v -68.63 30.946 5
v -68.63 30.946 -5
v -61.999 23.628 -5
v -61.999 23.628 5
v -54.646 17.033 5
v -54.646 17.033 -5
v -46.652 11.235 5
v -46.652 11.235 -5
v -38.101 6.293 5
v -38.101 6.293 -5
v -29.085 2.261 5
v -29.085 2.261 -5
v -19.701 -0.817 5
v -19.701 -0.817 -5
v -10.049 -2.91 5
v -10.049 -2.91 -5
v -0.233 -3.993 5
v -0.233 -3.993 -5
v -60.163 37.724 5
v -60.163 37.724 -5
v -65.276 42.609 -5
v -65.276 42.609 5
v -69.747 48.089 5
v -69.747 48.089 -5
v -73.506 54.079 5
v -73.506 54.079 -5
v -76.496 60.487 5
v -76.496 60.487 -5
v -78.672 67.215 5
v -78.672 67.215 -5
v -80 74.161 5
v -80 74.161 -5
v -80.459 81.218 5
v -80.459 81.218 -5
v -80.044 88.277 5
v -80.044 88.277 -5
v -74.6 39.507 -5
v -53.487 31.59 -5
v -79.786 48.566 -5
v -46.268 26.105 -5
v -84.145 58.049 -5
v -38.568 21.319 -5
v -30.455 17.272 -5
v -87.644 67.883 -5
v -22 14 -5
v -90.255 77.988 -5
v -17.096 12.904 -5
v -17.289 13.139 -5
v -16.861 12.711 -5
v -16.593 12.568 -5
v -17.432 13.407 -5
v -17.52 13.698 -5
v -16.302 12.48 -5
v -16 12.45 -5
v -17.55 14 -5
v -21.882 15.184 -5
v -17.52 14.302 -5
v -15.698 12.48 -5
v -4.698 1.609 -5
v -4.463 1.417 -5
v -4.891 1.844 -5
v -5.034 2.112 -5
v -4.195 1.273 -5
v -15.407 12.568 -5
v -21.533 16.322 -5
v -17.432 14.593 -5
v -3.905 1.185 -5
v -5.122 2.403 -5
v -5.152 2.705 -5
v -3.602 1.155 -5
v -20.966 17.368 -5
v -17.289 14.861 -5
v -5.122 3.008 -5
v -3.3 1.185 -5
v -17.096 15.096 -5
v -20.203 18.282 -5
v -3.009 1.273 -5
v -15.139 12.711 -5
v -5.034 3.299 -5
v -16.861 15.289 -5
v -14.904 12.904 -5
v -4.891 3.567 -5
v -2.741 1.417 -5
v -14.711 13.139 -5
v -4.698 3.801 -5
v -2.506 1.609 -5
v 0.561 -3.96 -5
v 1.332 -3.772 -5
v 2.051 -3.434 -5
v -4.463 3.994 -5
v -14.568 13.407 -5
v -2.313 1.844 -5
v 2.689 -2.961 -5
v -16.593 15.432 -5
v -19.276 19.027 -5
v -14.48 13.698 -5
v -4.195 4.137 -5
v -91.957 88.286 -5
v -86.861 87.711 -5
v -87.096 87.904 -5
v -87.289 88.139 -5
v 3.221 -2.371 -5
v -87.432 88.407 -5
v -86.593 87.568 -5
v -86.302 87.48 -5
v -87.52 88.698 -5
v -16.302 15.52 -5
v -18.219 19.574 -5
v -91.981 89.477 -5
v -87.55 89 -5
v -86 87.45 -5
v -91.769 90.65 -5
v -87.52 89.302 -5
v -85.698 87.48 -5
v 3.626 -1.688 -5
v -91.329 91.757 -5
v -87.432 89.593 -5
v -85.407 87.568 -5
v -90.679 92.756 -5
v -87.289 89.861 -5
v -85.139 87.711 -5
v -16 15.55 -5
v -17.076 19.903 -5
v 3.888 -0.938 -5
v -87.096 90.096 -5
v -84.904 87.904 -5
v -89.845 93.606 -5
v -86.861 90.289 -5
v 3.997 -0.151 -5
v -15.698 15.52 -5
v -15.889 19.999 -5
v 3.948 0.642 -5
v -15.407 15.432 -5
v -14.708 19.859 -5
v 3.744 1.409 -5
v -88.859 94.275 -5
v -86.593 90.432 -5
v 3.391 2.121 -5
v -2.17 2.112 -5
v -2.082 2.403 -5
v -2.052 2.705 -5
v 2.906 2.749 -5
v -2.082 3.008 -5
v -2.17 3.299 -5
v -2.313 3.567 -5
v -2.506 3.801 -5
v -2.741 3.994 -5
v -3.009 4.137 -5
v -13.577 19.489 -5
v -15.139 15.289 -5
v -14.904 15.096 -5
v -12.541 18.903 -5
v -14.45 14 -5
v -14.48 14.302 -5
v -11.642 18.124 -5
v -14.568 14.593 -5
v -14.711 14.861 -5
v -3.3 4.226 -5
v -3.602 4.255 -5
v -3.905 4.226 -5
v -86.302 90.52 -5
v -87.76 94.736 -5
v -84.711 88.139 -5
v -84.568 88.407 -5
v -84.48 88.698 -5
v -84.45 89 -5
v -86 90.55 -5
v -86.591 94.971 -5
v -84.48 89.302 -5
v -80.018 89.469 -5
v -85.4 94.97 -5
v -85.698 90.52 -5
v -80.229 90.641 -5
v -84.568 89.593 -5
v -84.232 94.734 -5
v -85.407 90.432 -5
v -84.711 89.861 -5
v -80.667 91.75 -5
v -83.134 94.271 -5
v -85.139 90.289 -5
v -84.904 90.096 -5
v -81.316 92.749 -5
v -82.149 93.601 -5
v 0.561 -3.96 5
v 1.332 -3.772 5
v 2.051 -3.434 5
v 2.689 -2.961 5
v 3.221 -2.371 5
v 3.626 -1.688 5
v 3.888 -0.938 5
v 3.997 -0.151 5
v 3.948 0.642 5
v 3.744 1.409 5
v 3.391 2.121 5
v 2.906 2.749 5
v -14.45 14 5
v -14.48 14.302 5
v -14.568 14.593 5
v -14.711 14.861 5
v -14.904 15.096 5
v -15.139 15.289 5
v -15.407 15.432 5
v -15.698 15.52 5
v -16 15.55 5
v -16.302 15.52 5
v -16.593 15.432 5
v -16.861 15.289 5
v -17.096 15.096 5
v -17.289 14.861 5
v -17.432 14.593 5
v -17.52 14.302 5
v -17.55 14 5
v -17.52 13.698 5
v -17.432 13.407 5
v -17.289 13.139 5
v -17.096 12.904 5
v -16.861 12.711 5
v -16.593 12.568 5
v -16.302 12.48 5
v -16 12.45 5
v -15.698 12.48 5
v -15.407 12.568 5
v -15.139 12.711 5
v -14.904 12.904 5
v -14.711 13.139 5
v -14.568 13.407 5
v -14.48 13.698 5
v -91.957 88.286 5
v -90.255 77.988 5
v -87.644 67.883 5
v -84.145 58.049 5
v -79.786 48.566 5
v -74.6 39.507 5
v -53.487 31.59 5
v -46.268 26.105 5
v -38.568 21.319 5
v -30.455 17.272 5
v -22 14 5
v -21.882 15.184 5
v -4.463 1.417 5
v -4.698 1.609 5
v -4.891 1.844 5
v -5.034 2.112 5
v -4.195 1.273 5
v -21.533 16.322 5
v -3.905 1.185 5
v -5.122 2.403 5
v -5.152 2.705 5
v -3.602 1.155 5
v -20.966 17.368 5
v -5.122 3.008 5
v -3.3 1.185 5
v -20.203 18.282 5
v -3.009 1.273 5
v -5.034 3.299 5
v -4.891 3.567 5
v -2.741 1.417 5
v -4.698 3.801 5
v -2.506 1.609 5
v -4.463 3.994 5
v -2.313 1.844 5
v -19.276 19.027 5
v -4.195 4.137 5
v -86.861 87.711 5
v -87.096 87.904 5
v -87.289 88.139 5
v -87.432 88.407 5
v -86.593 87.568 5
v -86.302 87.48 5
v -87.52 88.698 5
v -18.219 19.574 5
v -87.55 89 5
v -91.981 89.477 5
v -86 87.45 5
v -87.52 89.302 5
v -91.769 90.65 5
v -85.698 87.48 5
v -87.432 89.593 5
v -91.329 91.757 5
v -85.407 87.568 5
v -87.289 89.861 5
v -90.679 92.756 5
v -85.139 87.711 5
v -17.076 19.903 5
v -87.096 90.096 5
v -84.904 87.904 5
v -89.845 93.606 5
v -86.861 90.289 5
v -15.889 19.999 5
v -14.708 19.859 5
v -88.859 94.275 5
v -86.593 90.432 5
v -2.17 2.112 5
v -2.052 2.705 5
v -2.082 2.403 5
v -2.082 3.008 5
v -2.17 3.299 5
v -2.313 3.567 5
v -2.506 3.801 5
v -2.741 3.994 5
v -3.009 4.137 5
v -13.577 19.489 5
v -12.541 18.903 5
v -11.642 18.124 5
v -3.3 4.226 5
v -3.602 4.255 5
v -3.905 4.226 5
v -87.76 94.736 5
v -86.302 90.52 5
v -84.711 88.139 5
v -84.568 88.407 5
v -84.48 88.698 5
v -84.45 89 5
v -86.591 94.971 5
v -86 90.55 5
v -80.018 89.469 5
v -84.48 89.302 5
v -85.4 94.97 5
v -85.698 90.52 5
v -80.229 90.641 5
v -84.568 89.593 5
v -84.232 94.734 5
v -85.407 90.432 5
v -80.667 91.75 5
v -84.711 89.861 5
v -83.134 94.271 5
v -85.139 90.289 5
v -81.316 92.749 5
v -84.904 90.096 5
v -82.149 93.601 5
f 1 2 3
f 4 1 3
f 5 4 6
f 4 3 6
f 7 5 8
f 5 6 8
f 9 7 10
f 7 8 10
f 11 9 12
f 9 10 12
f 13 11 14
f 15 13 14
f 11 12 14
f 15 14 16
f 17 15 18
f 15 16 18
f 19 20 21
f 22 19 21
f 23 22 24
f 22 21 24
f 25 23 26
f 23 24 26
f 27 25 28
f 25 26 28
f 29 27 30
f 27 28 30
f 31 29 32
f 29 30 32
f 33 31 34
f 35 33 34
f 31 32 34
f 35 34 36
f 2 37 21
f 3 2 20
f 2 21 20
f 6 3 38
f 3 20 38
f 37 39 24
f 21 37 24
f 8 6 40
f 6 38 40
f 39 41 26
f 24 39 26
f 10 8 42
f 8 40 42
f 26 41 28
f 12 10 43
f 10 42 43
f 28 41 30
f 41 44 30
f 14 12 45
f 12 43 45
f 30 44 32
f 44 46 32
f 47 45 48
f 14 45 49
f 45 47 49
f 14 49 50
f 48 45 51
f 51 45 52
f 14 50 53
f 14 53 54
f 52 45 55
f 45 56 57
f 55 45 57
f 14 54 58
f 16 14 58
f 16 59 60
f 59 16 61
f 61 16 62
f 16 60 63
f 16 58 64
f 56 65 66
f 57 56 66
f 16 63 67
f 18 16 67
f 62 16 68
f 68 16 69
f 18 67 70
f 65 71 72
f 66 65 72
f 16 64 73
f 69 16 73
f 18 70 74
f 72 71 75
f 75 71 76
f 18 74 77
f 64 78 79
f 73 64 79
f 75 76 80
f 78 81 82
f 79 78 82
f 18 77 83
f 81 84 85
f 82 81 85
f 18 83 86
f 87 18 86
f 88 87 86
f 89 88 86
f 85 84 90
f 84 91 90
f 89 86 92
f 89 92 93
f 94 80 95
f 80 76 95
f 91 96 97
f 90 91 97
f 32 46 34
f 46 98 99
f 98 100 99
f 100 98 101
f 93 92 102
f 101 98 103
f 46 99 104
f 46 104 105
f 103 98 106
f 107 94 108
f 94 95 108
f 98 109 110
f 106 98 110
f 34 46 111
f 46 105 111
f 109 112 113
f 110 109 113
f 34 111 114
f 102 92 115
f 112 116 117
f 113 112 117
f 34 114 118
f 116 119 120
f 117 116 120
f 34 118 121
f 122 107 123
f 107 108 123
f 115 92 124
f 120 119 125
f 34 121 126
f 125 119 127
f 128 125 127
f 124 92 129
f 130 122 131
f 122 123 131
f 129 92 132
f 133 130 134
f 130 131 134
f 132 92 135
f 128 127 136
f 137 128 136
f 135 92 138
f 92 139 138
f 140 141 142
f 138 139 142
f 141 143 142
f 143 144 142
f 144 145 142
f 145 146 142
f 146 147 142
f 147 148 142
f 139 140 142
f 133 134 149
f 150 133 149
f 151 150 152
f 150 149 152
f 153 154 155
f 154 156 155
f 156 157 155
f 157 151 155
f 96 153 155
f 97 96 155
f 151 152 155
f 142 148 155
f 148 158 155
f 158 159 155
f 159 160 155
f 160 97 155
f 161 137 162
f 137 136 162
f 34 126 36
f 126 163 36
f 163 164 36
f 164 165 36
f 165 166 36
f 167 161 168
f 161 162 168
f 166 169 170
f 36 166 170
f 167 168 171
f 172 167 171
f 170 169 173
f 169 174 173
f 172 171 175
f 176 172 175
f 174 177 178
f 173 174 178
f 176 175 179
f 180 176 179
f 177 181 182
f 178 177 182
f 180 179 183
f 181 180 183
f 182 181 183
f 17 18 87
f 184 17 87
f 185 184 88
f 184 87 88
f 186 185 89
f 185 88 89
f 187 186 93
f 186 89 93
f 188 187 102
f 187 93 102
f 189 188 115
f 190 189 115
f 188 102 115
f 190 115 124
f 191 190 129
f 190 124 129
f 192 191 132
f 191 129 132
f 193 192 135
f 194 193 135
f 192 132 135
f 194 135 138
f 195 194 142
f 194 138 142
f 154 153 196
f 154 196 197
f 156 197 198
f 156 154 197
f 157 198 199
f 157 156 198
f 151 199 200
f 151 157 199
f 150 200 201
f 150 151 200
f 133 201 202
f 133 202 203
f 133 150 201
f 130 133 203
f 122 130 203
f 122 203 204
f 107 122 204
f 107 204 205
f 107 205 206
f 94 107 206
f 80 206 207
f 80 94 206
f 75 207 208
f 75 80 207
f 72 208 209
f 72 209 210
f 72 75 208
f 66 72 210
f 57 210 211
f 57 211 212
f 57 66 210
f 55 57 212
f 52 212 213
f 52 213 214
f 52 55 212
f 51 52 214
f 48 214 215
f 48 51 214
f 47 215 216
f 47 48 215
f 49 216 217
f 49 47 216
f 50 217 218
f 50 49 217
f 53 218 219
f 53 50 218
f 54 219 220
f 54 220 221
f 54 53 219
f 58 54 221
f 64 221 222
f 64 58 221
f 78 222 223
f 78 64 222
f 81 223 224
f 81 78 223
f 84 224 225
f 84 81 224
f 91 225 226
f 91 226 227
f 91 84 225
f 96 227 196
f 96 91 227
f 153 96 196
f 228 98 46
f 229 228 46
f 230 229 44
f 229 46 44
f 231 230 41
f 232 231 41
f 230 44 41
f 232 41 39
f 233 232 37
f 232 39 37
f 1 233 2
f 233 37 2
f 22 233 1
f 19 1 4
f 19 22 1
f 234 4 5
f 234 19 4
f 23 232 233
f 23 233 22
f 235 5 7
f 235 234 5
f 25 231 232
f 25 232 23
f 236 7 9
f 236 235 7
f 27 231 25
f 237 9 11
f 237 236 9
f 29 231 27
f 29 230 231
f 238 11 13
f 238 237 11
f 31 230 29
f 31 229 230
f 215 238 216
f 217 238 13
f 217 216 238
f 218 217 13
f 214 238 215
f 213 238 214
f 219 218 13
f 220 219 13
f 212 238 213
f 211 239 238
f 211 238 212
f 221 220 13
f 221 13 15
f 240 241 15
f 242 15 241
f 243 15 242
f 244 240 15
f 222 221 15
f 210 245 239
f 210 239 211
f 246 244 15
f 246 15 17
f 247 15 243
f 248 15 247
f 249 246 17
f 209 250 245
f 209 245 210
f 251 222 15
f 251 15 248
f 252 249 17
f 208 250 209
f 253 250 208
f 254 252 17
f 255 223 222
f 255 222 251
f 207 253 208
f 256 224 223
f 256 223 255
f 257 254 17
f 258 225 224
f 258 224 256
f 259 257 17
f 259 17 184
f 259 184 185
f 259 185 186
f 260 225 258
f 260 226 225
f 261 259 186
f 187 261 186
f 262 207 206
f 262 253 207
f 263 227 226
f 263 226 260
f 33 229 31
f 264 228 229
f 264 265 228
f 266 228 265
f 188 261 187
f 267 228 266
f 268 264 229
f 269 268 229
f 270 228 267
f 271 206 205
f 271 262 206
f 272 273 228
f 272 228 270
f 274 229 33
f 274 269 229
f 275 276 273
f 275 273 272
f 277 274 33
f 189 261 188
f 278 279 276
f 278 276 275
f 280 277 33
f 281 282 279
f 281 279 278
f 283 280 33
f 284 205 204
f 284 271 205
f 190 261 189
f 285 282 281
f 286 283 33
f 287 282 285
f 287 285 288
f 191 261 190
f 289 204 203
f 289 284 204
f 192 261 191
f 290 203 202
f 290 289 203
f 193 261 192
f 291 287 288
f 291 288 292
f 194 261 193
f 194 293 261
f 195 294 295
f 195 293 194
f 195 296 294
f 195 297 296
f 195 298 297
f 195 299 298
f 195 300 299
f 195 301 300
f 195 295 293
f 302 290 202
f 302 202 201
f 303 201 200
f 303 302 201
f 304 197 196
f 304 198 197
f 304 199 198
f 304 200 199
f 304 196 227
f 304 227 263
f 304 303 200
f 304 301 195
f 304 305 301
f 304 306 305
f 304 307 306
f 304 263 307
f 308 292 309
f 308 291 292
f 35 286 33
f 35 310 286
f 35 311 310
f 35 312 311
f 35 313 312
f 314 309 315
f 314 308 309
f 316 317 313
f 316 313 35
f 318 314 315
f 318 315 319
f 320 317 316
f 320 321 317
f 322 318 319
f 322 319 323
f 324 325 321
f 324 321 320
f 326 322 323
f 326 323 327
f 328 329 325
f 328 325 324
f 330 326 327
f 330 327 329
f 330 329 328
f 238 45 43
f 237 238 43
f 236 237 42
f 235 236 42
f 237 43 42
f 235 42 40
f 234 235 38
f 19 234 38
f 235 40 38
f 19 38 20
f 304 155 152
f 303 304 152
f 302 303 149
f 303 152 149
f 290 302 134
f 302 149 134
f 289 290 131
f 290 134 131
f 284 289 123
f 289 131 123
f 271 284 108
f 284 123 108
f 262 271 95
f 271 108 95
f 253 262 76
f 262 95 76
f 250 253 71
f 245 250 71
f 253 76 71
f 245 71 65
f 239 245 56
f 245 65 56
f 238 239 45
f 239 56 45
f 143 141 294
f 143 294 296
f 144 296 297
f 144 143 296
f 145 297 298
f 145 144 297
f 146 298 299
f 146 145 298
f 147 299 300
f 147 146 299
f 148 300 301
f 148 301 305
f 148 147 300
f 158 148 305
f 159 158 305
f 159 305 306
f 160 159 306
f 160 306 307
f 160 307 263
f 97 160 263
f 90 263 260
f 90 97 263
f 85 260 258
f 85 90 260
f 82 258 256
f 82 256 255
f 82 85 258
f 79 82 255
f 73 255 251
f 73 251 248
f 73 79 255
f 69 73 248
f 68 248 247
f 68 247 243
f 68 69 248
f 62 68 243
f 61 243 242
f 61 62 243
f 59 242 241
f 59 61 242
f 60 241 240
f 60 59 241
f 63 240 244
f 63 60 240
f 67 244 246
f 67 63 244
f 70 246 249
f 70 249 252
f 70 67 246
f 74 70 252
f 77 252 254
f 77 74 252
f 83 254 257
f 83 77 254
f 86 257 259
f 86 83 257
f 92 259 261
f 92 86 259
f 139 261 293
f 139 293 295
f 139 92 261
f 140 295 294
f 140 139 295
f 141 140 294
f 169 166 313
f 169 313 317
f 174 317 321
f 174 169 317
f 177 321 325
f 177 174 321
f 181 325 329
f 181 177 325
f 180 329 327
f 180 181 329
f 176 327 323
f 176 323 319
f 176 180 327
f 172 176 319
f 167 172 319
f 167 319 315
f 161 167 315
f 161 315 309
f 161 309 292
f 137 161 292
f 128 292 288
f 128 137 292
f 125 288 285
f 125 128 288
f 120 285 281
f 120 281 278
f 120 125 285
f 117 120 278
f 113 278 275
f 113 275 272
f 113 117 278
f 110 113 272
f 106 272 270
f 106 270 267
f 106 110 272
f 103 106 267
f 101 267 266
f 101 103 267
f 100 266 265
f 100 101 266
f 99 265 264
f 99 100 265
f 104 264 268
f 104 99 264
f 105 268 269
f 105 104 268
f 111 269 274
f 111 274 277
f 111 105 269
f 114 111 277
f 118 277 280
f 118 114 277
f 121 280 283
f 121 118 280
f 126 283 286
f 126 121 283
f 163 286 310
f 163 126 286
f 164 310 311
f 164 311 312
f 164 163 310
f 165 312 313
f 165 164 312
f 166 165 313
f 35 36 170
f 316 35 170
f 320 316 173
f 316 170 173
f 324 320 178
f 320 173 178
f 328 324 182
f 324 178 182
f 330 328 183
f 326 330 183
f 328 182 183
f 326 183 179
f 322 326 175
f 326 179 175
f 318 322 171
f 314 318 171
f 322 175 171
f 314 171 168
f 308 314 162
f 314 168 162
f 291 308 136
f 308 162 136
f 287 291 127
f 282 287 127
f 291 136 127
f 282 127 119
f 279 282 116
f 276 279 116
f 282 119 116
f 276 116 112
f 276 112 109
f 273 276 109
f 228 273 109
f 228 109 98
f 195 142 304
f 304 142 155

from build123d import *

# Parameters (mm, degrees)
BOSS_EXTRUDE1_DEPTH      = 5
BOSS_EXTRUDE1_DEPTH_BACK = 5
SKETCH2_R                = 1.55


with BuildPart() as part:
    # Sketch2 → Boss-Extrude1 (new, two sides: drawn at the far end of the back side and taken through both)
    with BuildSketch(Plane.XY.offset(-BOSS_EXTRUDE1_DEPTH_BACK)):
        with BuildLine():
            Line((2.905523423, 2.749169627), (-11.641714865, 18.12375444))
            ThreePointArc((-11.641714865, 18.12375444), (-18.21926668, 19.574482524), (-22, 14))
            ThreePointArc((-22, 14), (-42.474078457, 23.622085), (-60.163399658, 37.723869421))
            ThreePointArc((-60.163399658, 37.723869421), (-76.495910352, 60.486816081), (-80.043672644, 88.277390543))
            ThreePointArc((-80.043672644, 88.277390543), (-85.99568578, 94.999998449), (-91.957360362, 88.285956923))
            ThreePointArc((-91.957360362, 88.285956923), (-84.145355247, 58.049091263), (-68.630234445, 30.946019566))
            ThreePointArc((-68.630234445, 30.946019566), (-38.101001964, 6.292742427), (-0.232587209, -3.993232173))
            ThreePointArc((-0.232587209, -3.993232173), (3.626450401, -1.687855885), (2.905523423, 2.749169627))
        make_face()
        with Locations((-86, 89)):
            Circle(SKETCH2_R, mode=Mode.SUBTRACT)
        with Locations((-16, 14)):
            Circle(SKETCH2_R, mode=Mode.SUBTRACT)
        with Locations((-3.6022, 2.7054)):
            Circle(SKETCH2_R, mode=Mode.SUBTRACT)
    extrude(amount=BOSS_EXTRUDE1_DEPTH + BOSS_EXTRUDE1_DEPTH_BACK)


solid = part.part
